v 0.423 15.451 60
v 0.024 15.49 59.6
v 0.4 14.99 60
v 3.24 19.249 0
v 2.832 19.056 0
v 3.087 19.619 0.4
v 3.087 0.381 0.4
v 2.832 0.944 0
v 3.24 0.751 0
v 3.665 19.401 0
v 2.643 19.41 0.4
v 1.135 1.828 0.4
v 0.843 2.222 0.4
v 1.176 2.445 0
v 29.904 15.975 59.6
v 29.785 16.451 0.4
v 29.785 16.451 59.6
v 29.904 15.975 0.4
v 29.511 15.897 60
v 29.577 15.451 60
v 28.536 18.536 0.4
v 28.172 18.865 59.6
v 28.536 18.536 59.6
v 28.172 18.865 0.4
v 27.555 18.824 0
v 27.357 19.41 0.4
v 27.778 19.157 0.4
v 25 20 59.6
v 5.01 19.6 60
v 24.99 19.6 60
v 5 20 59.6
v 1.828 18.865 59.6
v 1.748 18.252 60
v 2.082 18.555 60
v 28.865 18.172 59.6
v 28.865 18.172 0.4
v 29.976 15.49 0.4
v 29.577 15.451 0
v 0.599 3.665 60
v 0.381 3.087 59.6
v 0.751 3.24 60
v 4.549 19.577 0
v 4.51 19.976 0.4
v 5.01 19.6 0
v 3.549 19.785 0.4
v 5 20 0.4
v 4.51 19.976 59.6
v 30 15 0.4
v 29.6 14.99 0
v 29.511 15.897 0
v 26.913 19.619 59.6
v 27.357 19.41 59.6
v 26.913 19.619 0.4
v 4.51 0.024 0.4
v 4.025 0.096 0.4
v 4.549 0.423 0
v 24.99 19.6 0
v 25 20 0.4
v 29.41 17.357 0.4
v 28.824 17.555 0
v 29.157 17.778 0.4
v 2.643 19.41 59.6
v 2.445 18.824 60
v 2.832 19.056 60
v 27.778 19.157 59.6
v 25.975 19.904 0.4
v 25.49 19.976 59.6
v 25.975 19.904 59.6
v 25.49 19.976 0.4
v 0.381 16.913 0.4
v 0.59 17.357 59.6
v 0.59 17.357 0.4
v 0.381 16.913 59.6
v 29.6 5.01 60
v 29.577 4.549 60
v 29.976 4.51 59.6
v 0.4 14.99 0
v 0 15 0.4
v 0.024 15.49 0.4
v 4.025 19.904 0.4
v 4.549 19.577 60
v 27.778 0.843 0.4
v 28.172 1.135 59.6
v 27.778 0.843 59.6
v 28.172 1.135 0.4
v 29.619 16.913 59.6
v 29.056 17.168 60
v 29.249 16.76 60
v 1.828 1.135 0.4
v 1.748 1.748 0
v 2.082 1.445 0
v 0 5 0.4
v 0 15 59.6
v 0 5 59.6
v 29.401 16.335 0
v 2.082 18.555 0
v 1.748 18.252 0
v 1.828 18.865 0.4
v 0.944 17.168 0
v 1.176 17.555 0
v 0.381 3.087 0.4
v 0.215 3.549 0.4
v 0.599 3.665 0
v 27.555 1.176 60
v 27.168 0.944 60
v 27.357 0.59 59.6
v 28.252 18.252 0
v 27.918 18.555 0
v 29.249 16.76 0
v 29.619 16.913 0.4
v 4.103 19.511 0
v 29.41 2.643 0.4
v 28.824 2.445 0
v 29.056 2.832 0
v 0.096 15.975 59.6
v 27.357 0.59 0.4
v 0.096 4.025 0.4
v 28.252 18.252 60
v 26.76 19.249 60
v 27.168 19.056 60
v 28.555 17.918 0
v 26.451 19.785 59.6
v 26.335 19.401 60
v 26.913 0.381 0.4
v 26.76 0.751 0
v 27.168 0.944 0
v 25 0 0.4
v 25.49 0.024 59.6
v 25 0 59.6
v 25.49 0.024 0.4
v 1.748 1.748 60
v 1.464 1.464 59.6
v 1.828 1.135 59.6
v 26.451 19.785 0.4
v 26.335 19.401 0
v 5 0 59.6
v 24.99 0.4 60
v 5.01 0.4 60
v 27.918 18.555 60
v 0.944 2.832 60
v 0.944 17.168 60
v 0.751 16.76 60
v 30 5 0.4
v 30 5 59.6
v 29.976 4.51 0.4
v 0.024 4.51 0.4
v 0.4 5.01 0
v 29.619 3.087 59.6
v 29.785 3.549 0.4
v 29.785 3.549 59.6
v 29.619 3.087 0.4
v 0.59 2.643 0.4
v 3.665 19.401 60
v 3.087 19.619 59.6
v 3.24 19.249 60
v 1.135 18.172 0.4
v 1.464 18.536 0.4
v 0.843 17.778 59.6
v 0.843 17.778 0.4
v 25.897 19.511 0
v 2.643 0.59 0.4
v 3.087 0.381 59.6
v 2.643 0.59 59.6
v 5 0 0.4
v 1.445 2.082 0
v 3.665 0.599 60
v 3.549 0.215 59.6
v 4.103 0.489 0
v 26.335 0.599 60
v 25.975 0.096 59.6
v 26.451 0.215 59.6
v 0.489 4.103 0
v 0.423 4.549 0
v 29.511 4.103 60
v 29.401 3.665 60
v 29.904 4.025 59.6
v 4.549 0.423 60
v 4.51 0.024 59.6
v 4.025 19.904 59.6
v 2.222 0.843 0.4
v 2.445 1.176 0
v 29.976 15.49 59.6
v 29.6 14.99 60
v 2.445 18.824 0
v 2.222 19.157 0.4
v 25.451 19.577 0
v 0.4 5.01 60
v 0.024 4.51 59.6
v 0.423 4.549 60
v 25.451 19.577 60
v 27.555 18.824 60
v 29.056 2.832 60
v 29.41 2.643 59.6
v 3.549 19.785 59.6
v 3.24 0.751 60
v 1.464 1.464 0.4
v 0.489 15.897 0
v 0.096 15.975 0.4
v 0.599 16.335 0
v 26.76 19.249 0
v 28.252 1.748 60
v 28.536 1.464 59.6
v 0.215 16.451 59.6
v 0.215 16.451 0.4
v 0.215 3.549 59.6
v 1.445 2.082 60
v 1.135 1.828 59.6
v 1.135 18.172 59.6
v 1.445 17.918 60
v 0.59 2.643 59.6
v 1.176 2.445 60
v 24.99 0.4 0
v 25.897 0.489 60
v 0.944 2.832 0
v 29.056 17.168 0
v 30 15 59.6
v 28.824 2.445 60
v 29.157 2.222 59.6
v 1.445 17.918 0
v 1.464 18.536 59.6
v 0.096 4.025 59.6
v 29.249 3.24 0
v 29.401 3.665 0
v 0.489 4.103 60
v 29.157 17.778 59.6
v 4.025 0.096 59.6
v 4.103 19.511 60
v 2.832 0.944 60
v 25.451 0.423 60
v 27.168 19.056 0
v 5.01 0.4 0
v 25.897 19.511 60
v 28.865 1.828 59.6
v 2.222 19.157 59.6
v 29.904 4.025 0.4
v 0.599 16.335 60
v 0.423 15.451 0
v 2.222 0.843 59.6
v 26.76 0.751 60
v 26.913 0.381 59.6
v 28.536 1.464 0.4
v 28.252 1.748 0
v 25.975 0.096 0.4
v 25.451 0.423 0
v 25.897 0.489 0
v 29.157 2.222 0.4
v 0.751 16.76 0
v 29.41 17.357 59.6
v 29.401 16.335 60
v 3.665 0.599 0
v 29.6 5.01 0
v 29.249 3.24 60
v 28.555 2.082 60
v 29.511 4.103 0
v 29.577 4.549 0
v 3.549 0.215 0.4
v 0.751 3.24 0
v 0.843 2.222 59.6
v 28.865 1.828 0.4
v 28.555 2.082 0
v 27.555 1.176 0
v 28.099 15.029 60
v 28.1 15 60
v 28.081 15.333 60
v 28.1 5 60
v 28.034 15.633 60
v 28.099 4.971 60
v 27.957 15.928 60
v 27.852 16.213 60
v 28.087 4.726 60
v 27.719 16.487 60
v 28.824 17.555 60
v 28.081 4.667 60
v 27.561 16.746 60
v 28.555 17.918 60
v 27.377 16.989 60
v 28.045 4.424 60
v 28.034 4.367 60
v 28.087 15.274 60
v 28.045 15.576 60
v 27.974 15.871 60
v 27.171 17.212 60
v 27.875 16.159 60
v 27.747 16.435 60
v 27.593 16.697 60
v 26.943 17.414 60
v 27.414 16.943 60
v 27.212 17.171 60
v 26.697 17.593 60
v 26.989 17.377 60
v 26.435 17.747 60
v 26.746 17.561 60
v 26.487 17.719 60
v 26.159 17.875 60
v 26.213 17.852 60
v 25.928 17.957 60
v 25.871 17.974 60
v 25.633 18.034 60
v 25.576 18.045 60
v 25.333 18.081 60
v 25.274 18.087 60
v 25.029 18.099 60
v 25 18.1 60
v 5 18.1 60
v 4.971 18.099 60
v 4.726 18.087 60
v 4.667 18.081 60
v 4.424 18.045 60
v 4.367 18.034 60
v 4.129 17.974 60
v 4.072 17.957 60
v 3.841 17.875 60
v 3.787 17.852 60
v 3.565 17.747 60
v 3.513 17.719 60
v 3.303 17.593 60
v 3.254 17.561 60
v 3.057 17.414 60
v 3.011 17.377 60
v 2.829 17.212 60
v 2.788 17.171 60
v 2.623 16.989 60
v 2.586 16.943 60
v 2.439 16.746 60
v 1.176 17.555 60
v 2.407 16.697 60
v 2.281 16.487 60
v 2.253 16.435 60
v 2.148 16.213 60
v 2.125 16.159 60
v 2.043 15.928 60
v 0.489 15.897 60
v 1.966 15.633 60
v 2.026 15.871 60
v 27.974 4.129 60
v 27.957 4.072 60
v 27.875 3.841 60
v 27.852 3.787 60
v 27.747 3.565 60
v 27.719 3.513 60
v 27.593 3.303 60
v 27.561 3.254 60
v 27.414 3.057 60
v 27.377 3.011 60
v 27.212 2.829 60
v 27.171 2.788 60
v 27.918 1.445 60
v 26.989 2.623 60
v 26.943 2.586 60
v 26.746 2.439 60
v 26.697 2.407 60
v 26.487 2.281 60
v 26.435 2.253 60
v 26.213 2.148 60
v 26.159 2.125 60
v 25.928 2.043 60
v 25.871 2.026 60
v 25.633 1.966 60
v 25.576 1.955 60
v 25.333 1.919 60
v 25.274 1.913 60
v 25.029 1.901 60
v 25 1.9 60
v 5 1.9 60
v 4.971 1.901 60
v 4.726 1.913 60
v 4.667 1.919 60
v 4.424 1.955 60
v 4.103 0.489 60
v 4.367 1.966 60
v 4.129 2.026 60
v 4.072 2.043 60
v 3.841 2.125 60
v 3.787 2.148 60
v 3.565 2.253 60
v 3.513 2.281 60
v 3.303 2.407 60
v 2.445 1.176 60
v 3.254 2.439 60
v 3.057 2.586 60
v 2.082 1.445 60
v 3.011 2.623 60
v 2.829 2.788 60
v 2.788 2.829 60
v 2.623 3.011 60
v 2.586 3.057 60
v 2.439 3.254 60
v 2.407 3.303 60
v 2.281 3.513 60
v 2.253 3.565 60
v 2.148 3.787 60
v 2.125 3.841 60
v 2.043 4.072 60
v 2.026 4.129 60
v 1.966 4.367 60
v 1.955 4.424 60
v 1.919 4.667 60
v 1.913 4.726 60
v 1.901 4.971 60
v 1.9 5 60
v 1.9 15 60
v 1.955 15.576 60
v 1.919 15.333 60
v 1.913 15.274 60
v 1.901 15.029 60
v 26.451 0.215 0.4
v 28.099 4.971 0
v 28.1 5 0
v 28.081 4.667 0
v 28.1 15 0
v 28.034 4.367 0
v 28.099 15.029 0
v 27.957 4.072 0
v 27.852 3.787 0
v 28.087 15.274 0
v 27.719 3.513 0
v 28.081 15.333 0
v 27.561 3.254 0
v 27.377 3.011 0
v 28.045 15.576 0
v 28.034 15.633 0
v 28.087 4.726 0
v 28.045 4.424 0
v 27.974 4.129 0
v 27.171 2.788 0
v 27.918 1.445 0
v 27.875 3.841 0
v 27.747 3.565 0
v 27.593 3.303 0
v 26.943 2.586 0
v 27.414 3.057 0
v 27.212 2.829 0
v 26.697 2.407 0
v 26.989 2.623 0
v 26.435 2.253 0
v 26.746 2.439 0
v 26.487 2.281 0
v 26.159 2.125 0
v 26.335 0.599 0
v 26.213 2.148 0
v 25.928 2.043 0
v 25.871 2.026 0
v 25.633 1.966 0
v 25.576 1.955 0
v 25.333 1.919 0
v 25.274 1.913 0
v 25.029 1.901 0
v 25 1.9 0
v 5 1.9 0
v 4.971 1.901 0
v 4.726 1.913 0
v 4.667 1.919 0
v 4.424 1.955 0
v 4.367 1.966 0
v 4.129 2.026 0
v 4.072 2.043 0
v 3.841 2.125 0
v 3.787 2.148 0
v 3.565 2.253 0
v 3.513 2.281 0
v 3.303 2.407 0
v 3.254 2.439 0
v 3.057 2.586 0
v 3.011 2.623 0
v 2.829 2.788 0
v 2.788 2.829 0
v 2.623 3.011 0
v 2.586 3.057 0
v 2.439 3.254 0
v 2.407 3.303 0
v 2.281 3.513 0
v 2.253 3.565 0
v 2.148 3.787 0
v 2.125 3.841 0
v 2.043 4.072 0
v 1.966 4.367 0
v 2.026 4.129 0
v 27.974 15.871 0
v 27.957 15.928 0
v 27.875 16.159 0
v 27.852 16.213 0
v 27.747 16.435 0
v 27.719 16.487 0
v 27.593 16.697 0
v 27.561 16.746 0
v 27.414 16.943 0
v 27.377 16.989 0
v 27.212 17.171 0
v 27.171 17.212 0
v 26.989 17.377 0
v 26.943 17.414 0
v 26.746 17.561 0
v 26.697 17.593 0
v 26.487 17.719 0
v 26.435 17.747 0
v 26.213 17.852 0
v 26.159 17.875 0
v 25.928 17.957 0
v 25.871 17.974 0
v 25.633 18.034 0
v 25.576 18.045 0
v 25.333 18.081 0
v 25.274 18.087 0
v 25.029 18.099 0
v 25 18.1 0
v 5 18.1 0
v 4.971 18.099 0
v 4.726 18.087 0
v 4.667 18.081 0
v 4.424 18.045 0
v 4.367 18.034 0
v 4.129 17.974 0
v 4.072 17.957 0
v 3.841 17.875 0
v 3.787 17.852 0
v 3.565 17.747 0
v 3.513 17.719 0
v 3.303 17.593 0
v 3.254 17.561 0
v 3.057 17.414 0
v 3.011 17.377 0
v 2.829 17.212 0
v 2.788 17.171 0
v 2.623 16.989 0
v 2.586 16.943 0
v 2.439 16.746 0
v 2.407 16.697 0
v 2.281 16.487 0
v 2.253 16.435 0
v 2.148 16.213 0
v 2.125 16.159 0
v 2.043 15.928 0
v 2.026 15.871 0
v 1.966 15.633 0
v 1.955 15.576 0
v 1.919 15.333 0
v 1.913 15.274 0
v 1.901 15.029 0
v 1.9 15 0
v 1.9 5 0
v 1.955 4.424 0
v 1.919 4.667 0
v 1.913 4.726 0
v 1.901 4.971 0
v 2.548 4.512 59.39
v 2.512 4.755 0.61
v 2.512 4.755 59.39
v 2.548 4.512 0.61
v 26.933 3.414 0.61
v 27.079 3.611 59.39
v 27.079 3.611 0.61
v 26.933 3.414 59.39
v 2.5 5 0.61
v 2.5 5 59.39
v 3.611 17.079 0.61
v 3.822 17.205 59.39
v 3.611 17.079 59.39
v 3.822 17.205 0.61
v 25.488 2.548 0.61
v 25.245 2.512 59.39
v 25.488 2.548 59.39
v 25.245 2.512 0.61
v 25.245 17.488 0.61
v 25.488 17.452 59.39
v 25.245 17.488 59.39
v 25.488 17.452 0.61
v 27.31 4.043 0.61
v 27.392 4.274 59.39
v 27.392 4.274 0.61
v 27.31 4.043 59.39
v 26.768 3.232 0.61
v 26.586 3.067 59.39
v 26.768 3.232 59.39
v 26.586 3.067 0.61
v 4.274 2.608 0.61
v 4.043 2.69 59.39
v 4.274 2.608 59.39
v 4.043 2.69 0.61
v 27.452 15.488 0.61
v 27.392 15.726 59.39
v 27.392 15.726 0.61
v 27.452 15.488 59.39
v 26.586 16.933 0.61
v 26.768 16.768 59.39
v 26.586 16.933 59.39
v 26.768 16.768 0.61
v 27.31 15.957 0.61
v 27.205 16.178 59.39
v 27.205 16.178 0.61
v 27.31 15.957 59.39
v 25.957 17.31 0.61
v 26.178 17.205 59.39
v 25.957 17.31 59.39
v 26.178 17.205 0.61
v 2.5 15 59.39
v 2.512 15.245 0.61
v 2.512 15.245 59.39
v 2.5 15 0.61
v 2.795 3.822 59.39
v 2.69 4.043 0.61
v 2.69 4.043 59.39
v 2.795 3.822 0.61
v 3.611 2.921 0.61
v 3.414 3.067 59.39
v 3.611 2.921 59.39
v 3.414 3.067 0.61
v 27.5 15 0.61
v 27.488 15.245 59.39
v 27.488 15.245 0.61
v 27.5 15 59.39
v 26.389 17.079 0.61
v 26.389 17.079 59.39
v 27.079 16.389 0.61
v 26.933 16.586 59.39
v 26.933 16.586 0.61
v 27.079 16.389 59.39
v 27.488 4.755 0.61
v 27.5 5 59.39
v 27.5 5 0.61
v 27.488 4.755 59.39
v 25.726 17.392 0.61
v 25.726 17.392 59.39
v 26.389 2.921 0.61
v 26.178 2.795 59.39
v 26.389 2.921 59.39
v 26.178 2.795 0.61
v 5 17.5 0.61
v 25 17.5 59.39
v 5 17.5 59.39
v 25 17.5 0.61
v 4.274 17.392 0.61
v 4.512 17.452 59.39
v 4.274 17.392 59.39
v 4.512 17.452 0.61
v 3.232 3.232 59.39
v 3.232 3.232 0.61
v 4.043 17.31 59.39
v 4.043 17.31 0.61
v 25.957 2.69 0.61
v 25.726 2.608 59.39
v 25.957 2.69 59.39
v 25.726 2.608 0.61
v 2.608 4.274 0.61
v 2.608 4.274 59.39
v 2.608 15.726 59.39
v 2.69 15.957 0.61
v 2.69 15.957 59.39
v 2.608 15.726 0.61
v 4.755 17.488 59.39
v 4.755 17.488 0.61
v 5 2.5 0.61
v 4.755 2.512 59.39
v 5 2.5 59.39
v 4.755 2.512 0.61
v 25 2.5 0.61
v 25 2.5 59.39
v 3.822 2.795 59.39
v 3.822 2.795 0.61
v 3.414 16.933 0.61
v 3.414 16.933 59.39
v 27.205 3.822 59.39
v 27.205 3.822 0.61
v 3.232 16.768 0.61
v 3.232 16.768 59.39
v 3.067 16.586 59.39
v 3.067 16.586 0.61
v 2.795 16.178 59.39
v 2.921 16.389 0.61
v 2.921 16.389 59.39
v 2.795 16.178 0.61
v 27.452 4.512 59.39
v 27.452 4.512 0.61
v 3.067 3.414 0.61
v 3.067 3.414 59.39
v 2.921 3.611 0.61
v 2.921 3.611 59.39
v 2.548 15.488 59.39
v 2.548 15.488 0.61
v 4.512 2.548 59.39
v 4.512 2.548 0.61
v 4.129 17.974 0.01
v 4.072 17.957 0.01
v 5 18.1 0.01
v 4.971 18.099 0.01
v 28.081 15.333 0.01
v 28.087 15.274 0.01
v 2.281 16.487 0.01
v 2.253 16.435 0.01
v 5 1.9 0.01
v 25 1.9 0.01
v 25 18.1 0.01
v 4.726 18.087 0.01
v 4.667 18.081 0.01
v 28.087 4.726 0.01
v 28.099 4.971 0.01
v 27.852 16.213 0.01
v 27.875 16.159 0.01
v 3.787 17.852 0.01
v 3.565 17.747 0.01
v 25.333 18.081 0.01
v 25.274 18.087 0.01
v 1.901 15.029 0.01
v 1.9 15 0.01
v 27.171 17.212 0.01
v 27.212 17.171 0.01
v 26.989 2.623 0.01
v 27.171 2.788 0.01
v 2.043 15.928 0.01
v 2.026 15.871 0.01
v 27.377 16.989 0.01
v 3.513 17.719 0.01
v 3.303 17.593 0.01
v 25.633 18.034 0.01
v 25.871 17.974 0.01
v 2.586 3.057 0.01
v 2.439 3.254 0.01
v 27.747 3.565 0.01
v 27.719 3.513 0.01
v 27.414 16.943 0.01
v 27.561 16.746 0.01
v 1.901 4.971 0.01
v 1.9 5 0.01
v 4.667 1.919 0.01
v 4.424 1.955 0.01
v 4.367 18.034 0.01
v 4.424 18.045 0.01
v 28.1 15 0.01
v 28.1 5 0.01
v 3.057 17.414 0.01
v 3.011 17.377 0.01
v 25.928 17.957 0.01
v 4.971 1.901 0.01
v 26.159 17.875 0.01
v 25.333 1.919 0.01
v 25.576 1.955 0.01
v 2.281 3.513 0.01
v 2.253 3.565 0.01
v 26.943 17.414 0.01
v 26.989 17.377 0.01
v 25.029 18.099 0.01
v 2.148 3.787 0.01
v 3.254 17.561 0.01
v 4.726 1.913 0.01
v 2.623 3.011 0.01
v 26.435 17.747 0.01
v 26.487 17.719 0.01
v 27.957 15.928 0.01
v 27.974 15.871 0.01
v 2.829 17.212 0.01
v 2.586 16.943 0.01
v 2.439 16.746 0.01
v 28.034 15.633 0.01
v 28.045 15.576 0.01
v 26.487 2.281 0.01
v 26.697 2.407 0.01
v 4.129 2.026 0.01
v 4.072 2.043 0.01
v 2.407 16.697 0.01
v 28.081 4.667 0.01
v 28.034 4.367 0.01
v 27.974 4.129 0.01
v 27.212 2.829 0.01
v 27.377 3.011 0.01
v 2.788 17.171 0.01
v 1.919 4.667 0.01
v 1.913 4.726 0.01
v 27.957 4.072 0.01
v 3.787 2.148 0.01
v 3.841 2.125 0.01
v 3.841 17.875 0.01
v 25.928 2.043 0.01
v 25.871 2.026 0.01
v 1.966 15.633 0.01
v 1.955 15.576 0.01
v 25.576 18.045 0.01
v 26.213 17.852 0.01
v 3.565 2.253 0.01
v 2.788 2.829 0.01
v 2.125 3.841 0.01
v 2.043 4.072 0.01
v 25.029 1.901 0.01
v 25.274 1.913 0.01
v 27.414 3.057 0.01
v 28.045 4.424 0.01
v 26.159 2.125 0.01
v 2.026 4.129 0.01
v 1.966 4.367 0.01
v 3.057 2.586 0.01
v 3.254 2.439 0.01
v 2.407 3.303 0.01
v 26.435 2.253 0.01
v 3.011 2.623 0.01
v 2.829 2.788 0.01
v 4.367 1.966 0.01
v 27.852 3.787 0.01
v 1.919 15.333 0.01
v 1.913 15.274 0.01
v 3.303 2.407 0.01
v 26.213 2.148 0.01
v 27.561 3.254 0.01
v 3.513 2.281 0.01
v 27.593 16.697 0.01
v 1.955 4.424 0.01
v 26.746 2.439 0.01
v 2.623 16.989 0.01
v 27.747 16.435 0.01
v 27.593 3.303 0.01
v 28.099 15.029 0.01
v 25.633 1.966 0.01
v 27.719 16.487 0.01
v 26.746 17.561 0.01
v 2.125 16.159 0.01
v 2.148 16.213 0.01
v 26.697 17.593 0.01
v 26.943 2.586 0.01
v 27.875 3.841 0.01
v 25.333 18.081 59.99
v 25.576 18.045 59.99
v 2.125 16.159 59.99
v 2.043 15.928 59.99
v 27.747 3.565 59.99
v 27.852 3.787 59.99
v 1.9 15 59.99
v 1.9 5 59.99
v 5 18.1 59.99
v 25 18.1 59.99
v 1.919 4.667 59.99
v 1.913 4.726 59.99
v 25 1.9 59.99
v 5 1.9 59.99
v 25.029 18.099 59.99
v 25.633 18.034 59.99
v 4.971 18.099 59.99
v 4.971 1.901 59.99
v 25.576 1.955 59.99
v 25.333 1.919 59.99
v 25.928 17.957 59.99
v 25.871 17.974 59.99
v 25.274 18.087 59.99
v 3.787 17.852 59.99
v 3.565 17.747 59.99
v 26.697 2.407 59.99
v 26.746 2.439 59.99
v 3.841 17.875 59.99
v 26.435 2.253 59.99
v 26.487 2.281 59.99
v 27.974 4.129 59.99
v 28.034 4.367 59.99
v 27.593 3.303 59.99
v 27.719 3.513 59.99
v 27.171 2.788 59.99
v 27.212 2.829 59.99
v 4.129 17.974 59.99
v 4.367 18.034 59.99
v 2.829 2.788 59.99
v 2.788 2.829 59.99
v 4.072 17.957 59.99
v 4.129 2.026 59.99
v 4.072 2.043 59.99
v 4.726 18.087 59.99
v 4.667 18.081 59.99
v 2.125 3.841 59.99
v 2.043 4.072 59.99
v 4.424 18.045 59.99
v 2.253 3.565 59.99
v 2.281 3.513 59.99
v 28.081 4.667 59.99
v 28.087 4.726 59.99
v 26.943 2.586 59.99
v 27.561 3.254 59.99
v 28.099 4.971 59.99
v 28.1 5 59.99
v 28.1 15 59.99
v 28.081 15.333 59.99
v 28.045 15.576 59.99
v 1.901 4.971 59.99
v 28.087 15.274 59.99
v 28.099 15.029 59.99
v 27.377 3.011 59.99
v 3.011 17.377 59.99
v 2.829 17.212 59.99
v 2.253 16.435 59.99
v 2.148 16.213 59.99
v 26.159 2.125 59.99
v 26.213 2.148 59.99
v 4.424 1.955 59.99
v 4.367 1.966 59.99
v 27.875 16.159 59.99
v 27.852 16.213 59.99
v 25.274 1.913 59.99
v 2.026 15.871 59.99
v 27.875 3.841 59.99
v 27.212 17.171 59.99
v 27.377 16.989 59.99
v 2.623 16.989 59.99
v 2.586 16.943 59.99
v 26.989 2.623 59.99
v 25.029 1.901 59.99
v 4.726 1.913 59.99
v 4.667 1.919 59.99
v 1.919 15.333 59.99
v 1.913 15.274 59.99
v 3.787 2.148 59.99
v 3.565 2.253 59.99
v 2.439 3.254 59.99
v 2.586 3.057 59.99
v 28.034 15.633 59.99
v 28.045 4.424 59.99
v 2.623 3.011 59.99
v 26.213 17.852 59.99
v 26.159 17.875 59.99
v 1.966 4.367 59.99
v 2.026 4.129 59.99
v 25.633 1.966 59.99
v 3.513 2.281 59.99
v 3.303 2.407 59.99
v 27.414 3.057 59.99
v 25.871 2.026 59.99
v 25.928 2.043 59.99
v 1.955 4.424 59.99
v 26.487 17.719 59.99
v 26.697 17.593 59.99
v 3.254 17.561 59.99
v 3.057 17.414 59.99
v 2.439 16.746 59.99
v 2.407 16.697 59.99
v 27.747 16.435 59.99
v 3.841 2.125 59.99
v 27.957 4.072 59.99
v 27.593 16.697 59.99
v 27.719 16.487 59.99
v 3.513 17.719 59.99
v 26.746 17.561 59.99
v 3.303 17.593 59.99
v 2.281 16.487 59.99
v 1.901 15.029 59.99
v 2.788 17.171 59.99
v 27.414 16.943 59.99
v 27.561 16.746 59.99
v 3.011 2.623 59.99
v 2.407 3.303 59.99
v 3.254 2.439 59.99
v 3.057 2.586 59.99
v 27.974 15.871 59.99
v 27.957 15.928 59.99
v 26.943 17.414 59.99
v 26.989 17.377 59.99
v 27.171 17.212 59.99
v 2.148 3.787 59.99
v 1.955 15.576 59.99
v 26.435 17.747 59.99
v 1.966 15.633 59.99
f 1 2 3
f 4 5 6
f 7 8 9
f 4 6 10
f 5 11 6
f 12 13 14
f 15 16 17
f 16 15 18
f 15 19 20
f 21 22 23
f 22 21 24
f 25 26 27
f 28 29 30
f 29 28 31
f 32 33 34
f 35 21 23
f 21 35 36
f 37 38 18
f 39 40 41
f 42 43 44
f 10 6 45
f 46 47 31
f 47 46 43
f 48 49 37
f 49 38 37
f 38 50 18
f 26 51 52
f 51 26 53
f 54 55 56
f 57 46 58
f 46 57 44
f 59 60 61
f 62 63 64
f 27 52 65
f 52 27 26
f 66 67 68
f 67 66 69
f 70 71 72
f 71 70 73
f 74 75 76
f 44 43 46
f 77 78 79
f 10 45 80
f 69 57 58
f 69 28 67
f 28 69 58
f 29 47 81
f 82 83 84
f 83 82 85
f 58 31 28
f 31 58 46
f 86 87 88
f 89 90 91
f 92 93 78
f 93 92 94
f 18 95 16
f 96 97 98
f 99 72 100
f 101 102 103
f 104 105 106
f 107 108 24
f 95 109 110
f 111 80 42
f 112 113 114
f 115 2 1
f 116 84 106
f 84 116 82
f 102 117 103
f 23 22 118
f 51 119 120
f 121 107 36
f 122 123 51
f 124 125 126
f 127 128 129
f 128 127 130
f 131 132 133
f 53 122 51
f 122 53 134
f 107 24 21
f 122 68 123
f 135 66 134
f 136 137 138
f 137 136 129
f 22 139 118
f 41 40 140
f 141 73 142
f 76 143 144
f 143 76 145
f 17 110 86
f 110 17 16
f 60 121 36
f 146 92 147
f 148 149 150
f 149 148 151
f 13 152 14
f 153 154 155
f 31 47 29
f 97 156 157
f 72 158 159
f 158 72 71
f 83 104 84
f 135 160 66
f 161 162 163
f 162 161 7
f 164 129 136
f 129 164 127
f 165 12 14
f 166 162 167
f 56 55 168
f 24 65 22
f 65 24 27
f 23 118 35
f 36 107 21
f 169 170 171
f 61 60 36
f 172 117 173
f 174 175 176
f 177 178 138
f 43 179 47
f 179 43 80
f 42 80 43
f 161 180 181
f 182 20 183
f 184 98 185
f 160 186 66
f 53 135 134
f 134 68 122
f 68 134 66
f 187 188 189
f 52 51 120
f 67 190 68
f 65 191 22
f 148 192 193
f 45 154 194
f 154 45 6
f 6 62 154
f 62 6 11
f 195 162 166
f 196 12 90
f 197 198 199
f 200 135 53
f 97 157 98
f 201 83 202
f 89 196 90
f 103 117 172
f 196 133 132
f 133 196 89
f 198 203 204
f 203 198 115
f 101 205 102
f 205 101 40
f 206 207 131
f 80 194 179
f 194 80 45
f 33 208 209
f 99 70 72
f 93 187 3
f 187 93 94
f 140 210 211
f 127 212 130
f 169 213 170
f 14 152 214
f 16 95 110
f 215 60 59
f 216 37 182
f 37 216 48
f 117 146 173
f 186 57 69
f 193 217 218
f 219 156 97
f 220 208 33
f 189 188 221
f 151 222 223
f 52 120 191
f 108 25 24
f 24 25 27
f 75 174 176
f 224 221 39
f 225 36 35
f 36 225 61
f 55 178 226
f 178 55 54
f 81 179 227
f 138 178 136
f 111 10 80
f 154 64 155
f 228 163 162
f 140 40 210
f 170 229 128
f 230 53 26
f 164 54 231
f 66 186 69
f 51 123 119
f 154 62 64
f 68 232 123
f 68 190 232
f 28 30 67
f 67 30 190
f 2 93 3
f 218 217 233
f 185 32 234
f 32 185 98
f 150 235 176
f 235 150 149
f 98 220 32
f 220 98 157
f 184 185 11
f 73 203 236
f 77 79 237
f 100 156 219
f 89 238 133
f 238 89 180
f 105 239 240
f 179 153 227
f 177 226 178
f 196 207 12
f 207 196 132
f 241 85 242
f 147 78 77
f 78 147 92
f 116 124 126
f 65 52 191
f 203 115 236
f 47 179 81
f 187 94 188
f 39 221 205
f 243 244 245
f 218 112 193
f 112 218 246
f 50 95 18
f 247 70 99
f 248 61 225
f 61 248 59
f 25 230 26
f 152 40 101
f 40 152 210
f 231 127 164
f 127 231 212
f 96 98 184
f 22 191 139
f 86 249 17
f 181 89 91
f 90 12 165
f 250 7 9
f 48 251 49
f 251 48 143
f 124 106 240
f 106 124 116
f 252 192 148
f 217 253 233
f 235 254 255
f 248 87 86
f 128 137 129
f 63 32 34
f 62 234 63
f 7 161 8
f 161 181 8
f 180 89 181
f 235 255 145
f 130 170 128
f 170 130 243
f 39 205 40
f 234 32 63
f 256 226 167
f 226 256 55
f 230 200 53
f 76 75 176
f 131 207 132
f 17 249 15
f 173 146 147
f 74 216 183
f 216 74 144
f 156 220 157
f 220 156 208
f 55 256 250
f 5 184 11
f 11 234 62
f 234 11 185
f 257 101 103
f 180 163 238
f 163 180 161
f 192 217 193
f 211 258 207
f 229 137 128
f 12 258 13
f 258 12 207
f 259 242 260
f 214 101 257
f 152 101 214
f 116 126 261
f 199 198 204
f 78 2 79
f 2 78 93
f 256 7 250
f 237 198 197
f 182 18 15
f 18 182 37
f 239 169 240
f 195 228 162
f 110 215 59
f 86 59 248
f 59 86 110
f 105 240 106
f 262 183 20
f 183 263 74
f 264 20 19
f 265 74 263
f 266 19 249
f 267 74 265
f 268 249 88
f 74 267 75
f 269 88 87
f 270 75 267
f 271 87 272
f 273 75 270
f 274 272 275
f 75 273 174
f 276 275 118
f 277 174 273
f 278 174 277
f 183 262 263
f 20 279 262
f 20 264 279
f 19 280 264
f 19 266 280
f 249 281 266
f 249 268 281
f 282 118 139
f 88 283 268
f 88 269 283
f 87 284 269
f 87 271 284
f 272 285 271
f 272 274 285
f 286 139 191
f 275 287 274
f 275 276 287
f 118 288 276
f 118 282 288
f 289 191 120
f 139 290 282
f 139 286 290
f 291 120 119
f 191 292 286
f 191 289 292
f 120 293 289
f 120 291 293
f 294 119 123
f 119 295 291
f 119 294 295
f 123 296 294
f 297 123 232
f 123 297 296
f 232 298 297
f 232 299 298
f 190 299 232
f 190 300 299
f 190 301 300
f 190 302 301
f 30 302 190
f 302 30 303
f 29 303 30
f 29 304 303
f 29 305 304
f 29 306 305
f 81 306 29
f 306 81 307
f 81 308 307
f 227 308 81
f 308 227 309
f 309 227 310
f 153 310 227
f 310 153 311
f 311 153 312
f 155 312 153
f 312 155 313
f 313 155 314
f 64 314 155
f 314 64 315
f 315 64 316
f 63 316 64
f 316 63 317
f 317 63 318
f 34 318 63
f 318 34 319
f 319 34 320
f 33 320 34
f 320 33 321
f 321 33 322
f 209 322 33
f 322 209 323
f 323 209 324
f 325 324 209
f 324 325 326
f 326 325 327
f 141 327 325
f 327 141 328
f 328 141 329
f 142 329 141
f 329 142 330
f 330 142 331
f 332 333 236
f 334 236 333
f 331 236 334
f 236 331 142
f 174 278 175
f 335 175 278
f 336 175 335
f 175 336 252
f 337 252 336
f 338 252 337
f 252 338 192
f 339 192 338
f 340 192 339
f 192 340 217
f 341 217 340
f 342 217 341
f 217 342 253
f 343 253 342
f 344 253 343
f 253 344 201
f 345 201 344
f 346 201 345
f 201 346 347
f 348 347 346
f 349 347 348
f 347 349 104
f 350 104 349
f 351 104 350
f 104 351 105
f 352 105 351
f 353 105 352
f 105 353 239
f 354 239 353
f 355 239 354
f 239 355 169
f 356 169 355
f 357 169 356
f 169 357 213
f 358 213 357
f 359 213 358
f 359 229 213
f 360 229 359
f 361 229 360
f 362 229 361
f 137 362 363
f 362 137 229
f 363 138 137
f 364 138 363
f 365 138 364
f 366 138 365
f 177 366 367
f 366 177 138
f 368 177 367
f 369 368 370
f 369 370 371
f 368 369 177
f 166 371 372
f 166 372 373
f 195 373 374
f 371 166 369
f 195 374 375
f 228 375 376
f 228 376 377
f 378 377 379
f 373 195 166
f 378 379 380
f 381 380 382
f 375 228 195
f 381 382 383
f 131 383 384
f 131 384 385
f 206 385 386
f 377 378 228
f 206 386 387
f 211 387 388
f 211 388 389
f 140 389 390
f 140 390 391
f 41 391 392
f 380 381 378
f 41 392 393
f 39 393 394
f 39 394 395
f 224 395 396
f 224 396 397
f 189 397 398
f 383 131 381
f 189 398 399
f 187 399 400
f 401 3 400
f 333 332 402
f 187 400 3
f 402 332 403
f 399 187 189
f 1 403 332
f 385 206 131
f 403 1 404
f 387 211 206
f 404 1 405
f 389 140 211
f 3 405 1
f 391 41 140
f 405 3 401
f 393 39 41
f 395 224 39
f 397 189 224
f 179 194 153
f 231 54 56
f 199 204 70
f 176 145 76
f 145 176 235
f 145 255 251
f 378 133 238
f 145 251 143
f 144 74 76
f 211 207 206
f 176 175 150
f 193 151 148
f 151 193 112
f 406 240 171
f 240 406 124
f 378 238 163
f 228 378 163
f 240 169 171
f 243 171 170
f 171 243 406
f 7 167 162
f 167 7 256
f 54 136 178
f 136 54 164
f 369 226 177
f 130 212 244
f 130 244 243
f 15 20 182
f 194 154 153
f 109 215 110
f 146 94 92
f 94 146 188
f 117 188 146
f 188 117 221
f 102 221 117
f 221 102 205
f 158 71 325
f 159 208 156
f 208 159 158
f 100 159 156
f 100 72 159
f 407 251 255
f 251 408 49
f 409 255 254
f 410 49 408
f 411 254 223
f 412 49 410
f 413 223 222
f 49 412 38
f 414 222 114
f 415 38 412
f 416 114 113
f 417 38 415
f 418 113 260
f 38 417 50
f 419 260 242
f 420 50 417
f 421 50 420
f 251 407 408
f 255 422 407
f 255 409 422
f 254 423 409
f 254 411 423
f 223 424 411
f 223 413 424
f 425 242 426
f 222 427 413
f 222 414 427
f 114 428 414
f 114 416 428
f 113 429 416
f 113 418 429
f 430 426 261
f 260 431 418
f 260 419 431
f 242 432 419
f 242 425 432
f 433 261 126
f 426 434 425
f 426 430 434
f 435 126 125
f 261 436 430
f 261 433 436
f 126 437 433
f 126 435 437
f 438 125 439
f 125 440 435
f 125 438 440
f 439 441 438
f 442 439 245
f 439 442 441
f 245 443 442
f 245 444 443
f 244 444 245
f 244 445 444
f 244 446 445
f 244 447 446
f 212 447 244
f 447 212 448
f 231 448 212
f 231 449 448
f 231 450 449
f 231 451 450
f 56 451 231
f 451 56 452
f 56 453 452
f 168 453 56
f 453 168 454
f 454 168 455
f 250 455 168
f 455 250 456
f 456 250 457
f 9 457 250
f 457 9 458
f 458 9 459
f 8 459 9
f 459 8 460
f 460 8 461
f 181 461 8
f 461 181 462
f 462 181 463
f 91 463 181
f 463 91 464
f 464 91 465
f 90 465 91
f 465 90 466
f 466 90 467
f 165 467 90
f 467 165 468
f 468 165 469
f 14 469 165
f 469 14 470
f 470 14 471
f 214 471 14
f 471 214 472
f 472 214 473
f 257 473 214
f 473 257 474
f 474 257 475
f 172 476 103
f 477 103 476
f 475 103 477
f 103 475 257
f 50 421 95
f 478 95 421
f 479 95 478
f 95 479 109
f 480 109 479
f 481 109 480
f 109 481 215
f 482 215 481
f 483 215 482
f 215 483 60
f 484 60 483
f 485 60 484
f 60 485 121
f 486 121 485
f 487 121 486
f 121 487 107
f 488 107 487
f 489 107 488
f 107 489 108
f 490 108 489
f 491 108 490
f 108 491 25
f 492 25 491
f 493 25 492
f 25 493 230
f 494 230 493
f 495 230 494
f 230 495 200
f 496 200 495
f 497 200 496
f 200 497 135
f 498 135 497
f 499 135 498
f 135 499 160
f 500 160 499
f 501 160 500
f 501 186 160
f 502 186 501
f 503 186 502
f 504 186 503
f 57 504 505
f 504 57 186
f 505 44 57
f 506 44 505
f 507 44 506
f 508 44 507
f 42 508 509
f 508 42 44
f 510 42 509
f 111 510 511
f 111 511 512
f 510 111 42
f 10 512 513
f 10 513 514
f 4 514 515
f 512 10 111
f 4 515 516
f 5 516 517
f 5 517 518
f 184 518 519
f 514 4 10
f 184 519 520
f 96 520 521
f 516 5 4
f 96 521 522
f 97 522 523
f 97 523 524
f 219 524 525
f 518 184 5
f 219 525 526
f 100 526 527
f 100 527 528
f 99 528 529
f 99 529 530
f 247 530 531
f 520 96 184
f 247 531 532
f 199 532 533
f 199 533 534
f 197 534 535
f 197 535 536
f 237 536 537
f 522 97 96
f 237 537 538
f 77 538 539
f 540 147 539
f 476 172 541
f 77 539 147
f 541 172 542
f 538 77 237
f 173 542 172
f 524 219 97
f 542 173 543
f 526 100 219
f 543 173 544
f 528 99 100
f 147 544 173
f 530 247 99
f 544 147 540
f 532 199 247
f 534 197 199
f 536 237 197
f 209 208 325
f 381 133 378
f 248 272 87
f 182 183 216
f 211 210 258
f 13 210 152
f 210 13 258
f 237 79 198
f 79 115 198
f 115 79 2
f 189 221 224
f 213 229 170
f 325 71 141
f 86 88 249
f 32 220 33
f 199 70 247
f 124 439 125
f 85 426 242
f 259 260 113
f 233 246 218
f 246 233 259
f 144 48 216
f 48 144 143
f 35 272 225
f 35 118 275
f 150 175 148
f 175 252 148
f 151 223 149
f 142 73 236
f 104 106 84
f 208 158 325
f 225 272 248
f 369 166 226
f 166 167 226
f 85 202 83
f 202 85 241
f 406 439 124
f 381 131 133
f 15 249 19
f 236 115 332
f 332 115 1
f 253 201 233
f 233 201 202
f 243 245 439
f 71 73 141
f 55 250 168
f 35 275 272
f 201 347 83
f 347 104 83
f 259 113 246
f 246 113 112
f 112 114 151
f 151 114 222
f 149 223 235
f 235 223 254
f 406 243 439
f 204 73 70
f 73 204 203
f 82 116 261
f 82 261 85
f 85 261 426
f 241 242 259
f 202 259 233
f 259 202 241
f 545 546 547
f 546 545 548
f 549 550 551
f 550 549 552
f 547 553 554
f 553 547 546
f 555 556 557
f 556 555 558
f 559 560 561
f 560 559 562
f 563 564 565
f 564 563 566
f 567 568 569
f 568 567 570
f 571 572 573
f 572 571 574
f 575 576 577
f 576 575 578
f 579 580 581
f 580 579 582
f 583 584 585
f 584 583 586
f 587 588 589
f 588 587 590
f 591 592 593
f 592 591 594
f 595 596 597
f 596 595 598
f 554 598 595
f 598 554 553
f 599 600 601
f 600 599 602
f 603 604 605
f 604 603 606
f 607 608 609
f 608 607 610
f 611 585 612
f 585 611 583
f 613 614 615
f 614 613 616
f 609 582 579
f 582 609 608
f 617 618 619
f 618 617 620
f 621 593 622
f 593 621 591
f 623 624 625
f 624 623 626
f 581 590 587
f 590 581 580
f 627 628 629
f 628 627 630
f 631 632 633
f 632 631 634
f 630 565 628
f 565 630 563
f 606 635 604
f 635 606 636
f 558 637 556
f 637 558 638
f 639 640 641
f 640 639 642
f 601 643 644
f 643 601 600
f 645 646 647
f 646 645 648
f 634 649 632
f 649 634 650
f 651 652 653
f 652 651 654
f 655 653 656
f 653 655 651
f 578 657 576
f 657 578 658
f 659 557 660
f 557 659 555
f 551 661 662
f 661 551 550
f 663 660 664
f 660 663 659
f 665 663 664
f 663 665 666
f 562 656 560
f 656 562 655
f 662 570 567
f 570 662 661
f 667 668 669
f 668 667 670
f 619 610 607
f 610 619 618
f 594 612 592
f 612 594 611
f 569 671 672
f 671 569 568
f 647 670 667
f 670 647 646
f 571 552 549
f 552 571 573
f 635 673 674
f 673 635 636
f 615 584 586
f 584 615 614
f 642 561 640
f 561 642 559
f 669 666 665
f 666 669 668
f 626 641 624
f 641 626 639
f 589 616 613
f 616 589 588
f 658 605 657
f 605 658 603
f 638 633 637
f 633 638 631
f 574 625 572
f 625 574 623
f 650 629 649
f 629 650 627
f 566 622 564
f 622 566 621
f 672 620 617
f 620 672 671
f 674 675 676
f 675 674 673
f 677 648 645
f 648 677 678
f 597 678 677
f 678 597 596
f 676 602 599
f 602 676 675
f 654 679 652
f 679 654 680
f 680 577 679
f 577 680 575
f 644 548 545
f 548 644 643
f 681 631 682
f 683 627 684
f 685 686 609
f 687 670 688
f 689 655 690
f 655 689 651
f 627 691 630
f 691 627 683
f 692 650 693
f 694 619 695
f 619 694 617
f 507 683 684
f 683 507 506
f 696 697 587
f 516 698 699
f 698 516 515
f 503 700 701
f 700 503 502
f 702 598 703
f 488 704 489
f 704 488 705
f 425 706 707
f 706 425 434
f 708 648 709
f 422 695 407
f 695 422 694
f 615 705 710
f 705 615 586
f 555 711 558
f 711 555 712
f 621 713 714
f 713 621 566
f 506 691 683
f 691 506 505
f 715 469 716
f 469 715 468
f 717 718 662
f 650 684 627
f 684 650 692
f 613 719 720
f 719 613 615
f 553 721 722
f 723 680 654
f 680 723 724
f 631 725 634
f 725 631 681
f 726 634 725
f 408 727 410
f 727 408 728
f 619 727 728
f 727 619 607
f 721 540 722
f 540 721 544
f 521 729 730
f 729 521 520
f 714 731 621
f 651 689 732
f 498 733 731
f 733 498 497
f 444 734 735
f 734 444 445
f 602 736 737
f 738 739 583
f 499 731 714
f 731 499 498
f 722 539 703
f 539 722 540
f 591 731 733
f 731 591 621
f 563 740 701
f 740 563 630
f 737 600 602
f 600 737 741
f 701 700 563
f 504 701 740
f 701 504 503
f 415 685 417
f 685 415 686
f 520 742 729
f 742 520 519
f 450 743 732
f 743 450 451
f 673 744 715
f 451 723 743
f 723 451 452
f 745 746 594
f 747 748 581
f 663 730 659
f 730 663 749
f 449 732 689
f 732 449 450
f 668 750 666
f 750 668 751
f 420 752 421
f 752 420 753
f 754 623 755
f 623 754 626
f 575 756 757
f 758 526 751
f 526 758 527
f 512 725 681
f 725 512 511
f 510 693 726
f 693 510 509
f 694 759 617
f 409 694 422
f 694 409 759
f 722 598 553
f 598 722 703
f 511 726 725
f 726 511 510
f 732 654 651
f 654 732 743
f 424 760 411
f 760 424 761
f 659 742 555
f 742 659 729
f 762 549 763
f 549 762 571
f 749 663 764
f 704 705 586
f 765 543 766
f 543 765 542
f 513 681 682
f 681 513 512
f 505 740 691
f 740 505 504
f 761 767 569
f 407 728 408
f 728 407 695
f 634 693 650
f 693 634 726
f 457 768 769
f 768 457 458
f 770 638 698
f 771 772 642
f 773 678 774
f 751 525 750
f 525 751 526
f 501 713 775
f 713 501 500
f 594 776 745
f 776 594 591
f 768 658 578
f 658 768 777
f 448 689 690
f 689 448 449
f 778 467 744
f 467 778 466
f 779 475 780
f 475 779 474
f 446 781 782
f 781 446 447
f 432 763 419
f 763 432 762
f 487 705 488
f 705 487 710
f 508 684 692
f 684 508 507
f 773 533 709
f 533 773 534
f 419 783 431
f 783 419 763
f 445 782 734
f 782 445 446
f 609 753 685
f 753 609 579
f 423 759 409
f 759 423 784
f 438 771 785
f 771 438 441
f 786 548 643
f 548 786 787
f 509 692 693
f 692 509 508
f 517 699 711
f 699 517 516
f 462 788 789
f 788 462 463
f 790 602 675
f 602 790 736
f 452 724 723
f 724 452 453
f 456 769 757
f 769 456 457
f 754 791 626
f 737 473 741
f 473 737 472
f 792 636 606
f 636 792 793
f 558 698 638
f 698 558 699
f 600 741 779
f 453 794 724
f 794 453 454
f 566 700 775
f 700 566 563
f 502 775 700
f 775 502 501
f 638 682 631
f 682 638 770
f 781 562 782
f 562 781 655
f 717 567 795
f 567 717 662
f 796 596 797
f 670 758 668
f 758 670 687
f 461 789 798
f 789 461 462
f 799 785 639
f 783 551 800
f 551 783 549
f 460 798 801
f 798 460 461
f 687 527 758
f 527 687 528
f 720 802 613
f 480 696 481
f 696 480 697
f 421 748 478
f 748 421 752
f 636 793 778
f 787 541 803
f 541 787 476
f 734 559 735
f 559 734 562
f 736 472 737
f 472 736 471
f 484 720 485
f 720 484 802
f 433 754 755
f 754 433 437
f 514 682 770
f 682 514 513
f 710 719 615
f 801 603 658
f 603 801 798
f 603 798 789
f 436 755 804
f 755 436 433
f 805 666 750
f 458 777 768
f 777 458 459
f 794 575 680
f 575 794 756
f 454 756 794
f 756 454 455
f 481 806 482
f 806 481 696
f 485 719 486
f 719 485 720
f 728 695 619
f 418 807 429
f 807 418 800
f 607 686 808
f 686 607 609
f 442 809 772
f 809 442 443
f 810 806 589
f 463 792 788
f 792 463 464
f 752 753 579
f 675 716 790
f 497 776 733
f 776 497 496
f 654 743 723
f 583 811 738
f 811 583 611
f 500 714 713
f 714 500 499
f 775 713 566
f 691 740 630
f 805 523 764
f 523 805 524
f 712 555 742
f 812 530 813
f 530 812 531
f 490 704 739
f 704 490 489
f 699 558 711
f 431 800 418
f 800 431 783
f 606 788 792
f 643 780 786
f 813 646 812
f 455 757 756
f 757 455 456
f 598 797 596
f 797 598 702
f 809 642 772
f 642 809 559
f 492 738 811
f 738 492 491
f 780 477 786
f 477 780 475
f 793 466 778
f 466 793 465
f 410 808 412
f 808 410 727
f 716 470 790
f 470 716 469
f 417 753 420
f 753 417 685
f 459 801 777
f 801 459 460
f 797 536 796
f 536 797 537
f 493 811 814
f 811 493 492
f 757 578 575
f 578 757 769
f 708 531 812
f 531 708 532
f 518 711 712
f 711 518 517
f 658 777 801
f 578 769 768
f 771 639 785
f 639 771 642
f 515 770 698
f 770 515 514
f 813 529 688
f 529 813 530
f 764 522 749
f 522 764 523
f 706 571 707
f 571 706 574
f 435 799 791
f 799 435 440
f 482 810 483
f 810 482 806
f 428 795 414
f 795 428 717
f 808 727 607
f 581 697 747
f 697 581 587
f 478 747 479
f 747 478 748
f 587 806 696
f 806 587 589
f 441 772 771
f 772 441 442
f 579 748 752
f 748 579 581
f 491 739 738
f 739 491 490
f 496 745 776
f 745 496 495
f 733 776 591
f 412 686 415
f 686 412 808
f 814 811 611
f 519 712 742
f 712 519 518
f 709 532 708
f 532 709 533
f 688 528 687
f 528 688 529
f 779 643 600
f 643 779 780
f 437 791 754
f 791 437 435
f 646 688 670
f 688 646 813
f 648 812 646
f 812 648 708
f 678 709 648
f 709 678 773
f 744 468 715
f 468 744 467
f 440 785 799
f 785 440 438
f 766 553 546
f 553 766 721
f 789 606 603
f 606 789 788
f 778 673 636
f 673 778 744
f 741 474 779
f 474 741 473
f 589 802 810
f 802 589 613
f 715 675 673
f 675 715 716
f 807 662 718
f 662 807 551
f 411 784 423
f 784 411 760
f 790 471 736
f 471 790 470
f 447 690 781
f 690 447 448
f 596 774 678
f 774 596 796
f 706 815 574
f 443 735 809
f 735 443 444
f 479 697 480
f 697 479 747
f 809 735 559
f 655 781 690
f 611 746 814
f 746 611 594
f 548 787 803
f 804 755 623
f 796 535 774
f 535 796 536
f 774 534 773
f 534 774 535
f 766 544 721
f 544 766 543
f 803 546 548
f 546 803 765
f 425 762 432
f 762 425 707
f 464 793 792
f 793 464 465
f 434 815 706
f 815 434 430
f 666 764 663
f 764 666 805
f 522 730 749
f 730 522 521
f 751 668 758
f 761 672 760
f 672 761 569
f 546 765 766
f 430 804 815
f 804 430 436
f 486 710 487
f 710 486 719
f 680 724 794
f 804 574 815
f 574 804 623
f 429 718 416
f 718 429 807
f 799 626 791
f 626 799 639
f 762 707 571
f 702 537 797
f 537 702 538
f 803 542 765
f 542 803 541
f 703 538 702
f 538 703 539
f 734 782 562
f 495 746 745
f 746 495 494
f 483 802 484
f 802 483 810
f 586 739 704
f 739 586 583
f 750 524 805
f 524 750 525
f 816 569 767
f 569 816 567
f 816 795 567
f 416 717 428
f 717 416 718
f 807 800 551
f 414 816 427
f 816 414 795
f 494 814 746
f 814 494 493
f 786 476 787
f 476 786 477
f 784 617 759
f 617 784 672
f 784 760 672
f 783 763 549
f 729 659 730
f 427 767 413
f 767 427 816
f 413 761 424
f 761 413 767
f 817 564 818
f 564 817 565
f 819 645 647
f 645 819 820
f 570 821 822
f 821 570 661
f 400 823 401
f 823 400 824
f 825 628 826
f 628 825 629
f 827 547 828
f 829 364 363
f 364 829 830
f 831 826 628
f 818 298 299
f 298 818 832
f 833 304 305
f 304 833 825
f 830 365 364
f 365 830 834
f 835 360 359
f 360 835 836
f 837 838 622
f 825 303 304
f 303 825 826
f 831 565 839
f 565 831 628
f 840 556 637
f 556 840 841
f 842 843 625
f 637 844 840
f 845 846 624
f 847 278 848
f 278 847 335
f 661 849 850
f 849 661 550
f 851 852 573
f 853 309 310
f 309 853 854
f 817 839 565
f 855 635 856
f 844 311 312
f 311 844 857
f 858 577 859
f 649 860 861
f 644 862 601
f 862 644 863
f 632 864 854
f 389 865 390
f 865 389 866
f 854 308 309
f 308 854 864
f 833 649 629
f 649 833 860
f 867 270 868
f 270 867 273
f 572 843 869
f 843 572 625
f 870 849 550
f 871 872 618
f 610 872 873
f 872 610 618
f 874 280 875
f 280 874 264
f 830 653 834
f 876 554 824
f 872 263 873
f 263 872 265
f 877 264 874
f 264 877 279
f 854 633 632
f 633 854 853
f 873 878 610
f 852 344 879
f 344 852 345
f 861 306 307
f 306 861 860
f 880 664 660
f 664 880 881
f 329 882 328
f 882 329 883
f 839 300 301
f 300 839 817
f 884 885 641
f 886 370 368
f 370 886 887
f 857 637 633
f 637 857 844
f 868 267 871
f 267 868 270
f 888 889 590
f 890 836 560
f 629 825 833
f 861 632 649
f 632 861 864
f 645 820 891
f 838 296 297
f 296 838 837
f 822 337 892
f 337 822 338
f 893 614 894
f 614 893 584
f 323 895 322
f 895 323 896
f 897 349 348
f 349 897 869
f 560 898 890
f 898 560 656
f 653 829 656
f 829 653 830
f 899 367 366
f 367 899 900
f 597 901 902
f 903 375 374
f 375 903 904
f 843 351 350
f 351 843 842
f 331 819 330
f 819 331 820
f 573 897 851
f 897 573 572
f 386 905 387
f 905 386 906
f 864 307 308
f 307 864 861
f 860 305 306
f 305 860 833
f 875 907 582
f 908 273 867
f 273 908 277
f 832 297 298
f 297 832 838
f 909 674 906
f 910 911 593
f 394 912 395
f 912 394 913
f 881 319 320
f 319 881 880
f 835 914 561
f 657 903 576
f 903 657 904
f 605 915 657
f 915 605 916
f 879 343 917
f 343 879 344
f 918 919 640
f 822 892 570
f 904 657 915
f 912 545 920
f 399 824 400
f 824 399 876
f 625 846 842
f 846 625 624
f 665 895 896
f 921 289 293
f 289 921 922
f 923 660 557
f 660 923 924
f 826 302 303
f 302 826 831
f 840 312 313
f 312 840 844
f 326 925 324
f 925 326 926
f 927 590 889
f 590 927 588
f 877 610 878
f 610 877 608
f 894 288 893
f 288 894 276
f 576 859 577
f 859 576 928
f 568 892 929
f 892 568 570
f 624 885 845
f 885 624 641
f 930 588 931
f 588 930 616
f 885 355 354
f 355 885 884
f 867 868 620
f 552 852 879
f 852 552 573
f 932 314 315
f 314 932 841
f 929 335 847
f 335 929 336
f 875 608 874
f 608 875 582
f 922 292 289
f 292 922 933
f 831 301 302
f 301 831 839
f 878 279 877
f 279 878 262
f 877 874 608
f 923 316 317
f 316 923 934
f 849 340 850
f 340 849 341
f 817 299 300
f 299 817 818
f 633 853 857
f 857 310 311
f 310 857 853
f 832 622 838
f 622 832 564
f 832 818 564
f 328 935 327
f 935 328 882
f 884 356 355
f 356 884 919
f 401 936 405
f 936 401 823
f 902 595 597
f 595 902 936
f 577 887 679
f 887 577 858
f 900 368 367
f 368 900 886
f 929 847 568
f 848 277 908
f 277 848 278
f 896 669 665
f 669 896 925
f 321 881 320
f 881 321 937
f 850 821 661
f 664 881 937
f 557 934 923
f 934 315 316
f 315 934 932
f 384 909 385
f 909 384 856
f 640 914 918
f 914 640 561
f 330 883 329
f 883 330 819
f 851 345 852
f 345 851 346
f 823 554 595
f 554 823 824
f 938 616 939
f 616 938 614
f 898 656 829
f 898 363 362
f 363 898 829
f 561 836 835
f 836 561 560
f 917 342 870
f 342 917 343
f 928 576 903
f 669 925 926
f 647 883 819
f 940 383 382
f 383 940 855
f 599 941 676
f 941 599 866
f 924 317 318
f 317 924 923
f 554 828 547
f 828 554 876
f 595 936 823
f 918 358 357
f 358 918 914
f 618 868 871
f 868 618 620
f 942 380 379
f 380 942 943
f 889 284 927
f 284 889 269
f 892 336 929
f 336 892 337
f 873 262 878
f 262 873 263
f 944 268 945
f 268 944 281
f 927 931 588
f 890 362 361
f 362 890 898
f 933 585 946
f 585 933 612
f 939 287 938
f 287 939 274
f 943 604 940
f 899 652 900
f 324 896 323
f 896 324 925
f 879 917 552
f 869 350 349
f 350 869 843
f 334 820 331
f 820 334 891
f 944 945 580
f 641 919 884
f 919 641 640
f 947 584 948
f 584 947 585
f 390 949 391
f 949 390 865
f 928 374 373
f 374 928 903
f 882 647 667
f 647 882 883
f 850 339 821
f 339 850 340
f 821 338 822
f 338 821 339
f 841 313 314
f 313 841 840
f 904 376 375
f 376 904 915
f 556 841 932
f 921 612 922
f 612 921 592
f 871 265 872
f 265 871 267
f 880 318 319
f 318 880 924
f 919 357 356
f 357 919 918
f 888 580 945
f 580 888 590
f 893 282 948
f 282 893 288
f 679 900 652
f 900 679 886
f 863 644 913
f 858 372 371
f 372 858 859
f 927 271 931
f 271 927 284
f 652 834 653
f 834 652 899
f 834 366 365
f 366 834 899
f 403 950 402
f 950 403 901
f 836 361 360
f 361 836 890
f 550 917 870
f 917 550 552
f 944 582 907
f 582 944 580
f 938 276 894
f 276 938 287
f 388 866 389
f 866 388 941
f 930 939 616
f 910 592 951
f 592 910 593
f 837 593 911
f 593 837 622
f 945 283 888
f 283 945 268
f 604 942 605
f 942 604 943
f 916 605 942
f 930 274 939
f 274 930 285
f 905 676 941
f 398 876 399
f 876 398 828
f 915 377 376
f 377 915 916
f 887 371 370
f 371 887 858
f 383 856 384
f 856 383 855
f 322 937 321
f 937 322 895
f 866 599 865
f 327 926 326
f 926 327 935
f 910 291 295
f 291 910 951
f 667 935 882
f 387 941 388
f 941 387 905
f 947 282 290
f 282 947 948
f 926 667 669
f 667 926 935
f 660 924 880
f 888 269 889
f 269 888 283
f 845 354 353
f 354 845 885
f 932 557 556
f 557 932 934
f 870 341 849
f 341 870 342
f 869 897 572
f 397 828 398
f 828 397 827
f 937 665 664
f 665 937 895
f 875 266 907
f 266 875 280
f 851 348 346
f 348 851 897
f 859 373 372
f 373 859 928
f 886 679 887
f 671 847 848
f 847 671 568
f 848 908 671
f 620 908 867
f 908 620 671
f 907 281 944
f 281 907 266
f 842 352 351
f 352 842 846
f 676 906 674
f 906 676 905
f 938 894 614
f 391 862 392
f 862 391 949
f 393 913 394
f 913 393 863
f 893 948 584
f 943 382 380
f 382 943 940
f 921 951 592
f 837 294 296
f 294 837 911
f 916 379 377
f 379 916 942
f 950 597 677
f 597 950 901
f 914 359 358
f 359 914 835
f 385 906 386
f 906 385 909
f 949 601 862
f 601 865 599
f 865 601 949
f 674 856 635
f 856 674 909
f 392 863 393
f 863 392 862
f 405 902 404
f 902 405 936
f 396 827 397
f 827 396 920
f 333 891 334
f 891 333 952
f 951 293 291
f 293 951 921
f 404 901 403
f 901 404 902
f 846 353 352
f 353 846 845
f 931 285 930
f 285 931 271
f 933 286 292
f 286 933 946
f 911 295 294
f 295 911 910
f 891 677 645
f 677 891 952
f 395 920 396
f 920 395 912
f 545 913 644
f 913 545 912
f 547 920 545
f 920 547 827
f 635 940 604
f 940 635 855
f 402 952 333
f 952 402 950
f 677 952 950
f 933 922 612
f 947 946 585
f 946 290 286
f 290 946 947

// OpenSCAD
//! # Rounded rectangular tube with end chamfers — v0.1
//!
//! Standalone OpenSCAD example showing a hollow rounded rectangular tube.
//! The outside receives a chamfer at both end faces; the hollow inside gets
//! a separate chamfer at both ends.
//!
//! All dimensions are in millimetres.

$fn = 64;

outer_width   = 30;    // outer width (X)
outer_depth   = 20;    // outer depth (Y)
length        = 60;    // tube length (Z)
wall_thickness = 2.5;  // wall thickness
outer_radius  = 5;     // outside corner radius

inner_chamfer = 0.6;   // chamfer on the inside edge
outer_chamfer = 0.4;   // chamfer on the outside edge; must be smaller than outer_radius

epsilon = 0.01;

// Inner dimensions and inner corner radius.
inner_width  = outer_width - 2 * wall_thickness;
inner_depth  = outer_depth - 2 * wall_thickness;
inner_radius = max(outer_radius - wall_thickness, 0.01);

// Rounded rectangular 2D profile.
module rounded_rectangle(width, depth, radius) {
    hull()
        for (x = [radius, width - radius],
             y = [radius, depth - radius])
            translate([x, y])
                circle(radius);
}

module outer_2d()
    rounded_rectangle(outer_width, outer_depth, outer_radius);

module inner_2d()
    translate([wall_thickness, wall_thickness])
        rounded_rectangle(inner_width, inner_depth, inner_radius);

// Outer solid with a chamfer on both end faces.
module outer_body() {
    hull() {
        // Bottom face: inset by outer_chamfer.
        translate([0, 0, 0])
            linear_extrude(epsilon)
                offset(delta = -outer_chamfer)
                    outer_2d();

        // Full outer size between the two end chamfers.
        translate([0, 0, outer_chamfer])
            linear_extrude(length - 2 * outer_chamfer)
                outer_2d();

        // Top face: inset by outer_chamfer.
        translate([0, 0, length - epsilon])
            linear_extrude(epsilon)
                offset(delta = -outer_chamfer)
                    outer_2d();
    }
}

// Cutting volume for one inside chamfer.
module inner_chamfer_cut() {
    hull() {
        translate([0, 0, -epsilon])
            linear_extrude(2 * epsilon)
                offset(r = inner_chamfer)
                    inner_2d();

        translate([0, 0, inner_chamfer])
            linear_extrude(epsilon)
                inner_2d();
    }
}

module rounded_rectangular_tube() {
    difference() {
        outer_body();

        // Continuous hollow interior.
        translate([0, 0, -1])
            linear_extrude(length + 2)
                inner_2d();

        // Inside chamfer at the bottom and top end.
        inner_chamfer_cut();

        translate([0, 0, length])
            mirror([0, 0, 1])
                inner_chamfer_cut();
    }
}

rounded_rectangular_tube();
